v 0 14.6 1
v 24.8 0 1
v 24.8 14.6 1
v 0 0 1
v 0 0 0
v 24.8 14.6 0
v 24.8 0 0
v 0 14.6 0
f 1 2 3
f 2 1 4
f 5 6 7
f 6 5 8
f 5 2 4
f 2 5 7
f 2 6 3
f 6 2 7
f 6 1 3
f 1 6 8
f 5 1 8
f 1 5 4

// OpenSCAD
// PCB: 24.8mm x 14.6mm x 1.0mm
// One connected solid (single slab). Uses non-centered placement to avoid any viewer/camera issues.

pcb_length    = 24.8;
pcb_width     = 14.6;
pcb_thickness = 1.0;

color([0.0, 0.4, 0.2])
    cube([pcb_length, pcb_width, pcb_thickness], center=false);
